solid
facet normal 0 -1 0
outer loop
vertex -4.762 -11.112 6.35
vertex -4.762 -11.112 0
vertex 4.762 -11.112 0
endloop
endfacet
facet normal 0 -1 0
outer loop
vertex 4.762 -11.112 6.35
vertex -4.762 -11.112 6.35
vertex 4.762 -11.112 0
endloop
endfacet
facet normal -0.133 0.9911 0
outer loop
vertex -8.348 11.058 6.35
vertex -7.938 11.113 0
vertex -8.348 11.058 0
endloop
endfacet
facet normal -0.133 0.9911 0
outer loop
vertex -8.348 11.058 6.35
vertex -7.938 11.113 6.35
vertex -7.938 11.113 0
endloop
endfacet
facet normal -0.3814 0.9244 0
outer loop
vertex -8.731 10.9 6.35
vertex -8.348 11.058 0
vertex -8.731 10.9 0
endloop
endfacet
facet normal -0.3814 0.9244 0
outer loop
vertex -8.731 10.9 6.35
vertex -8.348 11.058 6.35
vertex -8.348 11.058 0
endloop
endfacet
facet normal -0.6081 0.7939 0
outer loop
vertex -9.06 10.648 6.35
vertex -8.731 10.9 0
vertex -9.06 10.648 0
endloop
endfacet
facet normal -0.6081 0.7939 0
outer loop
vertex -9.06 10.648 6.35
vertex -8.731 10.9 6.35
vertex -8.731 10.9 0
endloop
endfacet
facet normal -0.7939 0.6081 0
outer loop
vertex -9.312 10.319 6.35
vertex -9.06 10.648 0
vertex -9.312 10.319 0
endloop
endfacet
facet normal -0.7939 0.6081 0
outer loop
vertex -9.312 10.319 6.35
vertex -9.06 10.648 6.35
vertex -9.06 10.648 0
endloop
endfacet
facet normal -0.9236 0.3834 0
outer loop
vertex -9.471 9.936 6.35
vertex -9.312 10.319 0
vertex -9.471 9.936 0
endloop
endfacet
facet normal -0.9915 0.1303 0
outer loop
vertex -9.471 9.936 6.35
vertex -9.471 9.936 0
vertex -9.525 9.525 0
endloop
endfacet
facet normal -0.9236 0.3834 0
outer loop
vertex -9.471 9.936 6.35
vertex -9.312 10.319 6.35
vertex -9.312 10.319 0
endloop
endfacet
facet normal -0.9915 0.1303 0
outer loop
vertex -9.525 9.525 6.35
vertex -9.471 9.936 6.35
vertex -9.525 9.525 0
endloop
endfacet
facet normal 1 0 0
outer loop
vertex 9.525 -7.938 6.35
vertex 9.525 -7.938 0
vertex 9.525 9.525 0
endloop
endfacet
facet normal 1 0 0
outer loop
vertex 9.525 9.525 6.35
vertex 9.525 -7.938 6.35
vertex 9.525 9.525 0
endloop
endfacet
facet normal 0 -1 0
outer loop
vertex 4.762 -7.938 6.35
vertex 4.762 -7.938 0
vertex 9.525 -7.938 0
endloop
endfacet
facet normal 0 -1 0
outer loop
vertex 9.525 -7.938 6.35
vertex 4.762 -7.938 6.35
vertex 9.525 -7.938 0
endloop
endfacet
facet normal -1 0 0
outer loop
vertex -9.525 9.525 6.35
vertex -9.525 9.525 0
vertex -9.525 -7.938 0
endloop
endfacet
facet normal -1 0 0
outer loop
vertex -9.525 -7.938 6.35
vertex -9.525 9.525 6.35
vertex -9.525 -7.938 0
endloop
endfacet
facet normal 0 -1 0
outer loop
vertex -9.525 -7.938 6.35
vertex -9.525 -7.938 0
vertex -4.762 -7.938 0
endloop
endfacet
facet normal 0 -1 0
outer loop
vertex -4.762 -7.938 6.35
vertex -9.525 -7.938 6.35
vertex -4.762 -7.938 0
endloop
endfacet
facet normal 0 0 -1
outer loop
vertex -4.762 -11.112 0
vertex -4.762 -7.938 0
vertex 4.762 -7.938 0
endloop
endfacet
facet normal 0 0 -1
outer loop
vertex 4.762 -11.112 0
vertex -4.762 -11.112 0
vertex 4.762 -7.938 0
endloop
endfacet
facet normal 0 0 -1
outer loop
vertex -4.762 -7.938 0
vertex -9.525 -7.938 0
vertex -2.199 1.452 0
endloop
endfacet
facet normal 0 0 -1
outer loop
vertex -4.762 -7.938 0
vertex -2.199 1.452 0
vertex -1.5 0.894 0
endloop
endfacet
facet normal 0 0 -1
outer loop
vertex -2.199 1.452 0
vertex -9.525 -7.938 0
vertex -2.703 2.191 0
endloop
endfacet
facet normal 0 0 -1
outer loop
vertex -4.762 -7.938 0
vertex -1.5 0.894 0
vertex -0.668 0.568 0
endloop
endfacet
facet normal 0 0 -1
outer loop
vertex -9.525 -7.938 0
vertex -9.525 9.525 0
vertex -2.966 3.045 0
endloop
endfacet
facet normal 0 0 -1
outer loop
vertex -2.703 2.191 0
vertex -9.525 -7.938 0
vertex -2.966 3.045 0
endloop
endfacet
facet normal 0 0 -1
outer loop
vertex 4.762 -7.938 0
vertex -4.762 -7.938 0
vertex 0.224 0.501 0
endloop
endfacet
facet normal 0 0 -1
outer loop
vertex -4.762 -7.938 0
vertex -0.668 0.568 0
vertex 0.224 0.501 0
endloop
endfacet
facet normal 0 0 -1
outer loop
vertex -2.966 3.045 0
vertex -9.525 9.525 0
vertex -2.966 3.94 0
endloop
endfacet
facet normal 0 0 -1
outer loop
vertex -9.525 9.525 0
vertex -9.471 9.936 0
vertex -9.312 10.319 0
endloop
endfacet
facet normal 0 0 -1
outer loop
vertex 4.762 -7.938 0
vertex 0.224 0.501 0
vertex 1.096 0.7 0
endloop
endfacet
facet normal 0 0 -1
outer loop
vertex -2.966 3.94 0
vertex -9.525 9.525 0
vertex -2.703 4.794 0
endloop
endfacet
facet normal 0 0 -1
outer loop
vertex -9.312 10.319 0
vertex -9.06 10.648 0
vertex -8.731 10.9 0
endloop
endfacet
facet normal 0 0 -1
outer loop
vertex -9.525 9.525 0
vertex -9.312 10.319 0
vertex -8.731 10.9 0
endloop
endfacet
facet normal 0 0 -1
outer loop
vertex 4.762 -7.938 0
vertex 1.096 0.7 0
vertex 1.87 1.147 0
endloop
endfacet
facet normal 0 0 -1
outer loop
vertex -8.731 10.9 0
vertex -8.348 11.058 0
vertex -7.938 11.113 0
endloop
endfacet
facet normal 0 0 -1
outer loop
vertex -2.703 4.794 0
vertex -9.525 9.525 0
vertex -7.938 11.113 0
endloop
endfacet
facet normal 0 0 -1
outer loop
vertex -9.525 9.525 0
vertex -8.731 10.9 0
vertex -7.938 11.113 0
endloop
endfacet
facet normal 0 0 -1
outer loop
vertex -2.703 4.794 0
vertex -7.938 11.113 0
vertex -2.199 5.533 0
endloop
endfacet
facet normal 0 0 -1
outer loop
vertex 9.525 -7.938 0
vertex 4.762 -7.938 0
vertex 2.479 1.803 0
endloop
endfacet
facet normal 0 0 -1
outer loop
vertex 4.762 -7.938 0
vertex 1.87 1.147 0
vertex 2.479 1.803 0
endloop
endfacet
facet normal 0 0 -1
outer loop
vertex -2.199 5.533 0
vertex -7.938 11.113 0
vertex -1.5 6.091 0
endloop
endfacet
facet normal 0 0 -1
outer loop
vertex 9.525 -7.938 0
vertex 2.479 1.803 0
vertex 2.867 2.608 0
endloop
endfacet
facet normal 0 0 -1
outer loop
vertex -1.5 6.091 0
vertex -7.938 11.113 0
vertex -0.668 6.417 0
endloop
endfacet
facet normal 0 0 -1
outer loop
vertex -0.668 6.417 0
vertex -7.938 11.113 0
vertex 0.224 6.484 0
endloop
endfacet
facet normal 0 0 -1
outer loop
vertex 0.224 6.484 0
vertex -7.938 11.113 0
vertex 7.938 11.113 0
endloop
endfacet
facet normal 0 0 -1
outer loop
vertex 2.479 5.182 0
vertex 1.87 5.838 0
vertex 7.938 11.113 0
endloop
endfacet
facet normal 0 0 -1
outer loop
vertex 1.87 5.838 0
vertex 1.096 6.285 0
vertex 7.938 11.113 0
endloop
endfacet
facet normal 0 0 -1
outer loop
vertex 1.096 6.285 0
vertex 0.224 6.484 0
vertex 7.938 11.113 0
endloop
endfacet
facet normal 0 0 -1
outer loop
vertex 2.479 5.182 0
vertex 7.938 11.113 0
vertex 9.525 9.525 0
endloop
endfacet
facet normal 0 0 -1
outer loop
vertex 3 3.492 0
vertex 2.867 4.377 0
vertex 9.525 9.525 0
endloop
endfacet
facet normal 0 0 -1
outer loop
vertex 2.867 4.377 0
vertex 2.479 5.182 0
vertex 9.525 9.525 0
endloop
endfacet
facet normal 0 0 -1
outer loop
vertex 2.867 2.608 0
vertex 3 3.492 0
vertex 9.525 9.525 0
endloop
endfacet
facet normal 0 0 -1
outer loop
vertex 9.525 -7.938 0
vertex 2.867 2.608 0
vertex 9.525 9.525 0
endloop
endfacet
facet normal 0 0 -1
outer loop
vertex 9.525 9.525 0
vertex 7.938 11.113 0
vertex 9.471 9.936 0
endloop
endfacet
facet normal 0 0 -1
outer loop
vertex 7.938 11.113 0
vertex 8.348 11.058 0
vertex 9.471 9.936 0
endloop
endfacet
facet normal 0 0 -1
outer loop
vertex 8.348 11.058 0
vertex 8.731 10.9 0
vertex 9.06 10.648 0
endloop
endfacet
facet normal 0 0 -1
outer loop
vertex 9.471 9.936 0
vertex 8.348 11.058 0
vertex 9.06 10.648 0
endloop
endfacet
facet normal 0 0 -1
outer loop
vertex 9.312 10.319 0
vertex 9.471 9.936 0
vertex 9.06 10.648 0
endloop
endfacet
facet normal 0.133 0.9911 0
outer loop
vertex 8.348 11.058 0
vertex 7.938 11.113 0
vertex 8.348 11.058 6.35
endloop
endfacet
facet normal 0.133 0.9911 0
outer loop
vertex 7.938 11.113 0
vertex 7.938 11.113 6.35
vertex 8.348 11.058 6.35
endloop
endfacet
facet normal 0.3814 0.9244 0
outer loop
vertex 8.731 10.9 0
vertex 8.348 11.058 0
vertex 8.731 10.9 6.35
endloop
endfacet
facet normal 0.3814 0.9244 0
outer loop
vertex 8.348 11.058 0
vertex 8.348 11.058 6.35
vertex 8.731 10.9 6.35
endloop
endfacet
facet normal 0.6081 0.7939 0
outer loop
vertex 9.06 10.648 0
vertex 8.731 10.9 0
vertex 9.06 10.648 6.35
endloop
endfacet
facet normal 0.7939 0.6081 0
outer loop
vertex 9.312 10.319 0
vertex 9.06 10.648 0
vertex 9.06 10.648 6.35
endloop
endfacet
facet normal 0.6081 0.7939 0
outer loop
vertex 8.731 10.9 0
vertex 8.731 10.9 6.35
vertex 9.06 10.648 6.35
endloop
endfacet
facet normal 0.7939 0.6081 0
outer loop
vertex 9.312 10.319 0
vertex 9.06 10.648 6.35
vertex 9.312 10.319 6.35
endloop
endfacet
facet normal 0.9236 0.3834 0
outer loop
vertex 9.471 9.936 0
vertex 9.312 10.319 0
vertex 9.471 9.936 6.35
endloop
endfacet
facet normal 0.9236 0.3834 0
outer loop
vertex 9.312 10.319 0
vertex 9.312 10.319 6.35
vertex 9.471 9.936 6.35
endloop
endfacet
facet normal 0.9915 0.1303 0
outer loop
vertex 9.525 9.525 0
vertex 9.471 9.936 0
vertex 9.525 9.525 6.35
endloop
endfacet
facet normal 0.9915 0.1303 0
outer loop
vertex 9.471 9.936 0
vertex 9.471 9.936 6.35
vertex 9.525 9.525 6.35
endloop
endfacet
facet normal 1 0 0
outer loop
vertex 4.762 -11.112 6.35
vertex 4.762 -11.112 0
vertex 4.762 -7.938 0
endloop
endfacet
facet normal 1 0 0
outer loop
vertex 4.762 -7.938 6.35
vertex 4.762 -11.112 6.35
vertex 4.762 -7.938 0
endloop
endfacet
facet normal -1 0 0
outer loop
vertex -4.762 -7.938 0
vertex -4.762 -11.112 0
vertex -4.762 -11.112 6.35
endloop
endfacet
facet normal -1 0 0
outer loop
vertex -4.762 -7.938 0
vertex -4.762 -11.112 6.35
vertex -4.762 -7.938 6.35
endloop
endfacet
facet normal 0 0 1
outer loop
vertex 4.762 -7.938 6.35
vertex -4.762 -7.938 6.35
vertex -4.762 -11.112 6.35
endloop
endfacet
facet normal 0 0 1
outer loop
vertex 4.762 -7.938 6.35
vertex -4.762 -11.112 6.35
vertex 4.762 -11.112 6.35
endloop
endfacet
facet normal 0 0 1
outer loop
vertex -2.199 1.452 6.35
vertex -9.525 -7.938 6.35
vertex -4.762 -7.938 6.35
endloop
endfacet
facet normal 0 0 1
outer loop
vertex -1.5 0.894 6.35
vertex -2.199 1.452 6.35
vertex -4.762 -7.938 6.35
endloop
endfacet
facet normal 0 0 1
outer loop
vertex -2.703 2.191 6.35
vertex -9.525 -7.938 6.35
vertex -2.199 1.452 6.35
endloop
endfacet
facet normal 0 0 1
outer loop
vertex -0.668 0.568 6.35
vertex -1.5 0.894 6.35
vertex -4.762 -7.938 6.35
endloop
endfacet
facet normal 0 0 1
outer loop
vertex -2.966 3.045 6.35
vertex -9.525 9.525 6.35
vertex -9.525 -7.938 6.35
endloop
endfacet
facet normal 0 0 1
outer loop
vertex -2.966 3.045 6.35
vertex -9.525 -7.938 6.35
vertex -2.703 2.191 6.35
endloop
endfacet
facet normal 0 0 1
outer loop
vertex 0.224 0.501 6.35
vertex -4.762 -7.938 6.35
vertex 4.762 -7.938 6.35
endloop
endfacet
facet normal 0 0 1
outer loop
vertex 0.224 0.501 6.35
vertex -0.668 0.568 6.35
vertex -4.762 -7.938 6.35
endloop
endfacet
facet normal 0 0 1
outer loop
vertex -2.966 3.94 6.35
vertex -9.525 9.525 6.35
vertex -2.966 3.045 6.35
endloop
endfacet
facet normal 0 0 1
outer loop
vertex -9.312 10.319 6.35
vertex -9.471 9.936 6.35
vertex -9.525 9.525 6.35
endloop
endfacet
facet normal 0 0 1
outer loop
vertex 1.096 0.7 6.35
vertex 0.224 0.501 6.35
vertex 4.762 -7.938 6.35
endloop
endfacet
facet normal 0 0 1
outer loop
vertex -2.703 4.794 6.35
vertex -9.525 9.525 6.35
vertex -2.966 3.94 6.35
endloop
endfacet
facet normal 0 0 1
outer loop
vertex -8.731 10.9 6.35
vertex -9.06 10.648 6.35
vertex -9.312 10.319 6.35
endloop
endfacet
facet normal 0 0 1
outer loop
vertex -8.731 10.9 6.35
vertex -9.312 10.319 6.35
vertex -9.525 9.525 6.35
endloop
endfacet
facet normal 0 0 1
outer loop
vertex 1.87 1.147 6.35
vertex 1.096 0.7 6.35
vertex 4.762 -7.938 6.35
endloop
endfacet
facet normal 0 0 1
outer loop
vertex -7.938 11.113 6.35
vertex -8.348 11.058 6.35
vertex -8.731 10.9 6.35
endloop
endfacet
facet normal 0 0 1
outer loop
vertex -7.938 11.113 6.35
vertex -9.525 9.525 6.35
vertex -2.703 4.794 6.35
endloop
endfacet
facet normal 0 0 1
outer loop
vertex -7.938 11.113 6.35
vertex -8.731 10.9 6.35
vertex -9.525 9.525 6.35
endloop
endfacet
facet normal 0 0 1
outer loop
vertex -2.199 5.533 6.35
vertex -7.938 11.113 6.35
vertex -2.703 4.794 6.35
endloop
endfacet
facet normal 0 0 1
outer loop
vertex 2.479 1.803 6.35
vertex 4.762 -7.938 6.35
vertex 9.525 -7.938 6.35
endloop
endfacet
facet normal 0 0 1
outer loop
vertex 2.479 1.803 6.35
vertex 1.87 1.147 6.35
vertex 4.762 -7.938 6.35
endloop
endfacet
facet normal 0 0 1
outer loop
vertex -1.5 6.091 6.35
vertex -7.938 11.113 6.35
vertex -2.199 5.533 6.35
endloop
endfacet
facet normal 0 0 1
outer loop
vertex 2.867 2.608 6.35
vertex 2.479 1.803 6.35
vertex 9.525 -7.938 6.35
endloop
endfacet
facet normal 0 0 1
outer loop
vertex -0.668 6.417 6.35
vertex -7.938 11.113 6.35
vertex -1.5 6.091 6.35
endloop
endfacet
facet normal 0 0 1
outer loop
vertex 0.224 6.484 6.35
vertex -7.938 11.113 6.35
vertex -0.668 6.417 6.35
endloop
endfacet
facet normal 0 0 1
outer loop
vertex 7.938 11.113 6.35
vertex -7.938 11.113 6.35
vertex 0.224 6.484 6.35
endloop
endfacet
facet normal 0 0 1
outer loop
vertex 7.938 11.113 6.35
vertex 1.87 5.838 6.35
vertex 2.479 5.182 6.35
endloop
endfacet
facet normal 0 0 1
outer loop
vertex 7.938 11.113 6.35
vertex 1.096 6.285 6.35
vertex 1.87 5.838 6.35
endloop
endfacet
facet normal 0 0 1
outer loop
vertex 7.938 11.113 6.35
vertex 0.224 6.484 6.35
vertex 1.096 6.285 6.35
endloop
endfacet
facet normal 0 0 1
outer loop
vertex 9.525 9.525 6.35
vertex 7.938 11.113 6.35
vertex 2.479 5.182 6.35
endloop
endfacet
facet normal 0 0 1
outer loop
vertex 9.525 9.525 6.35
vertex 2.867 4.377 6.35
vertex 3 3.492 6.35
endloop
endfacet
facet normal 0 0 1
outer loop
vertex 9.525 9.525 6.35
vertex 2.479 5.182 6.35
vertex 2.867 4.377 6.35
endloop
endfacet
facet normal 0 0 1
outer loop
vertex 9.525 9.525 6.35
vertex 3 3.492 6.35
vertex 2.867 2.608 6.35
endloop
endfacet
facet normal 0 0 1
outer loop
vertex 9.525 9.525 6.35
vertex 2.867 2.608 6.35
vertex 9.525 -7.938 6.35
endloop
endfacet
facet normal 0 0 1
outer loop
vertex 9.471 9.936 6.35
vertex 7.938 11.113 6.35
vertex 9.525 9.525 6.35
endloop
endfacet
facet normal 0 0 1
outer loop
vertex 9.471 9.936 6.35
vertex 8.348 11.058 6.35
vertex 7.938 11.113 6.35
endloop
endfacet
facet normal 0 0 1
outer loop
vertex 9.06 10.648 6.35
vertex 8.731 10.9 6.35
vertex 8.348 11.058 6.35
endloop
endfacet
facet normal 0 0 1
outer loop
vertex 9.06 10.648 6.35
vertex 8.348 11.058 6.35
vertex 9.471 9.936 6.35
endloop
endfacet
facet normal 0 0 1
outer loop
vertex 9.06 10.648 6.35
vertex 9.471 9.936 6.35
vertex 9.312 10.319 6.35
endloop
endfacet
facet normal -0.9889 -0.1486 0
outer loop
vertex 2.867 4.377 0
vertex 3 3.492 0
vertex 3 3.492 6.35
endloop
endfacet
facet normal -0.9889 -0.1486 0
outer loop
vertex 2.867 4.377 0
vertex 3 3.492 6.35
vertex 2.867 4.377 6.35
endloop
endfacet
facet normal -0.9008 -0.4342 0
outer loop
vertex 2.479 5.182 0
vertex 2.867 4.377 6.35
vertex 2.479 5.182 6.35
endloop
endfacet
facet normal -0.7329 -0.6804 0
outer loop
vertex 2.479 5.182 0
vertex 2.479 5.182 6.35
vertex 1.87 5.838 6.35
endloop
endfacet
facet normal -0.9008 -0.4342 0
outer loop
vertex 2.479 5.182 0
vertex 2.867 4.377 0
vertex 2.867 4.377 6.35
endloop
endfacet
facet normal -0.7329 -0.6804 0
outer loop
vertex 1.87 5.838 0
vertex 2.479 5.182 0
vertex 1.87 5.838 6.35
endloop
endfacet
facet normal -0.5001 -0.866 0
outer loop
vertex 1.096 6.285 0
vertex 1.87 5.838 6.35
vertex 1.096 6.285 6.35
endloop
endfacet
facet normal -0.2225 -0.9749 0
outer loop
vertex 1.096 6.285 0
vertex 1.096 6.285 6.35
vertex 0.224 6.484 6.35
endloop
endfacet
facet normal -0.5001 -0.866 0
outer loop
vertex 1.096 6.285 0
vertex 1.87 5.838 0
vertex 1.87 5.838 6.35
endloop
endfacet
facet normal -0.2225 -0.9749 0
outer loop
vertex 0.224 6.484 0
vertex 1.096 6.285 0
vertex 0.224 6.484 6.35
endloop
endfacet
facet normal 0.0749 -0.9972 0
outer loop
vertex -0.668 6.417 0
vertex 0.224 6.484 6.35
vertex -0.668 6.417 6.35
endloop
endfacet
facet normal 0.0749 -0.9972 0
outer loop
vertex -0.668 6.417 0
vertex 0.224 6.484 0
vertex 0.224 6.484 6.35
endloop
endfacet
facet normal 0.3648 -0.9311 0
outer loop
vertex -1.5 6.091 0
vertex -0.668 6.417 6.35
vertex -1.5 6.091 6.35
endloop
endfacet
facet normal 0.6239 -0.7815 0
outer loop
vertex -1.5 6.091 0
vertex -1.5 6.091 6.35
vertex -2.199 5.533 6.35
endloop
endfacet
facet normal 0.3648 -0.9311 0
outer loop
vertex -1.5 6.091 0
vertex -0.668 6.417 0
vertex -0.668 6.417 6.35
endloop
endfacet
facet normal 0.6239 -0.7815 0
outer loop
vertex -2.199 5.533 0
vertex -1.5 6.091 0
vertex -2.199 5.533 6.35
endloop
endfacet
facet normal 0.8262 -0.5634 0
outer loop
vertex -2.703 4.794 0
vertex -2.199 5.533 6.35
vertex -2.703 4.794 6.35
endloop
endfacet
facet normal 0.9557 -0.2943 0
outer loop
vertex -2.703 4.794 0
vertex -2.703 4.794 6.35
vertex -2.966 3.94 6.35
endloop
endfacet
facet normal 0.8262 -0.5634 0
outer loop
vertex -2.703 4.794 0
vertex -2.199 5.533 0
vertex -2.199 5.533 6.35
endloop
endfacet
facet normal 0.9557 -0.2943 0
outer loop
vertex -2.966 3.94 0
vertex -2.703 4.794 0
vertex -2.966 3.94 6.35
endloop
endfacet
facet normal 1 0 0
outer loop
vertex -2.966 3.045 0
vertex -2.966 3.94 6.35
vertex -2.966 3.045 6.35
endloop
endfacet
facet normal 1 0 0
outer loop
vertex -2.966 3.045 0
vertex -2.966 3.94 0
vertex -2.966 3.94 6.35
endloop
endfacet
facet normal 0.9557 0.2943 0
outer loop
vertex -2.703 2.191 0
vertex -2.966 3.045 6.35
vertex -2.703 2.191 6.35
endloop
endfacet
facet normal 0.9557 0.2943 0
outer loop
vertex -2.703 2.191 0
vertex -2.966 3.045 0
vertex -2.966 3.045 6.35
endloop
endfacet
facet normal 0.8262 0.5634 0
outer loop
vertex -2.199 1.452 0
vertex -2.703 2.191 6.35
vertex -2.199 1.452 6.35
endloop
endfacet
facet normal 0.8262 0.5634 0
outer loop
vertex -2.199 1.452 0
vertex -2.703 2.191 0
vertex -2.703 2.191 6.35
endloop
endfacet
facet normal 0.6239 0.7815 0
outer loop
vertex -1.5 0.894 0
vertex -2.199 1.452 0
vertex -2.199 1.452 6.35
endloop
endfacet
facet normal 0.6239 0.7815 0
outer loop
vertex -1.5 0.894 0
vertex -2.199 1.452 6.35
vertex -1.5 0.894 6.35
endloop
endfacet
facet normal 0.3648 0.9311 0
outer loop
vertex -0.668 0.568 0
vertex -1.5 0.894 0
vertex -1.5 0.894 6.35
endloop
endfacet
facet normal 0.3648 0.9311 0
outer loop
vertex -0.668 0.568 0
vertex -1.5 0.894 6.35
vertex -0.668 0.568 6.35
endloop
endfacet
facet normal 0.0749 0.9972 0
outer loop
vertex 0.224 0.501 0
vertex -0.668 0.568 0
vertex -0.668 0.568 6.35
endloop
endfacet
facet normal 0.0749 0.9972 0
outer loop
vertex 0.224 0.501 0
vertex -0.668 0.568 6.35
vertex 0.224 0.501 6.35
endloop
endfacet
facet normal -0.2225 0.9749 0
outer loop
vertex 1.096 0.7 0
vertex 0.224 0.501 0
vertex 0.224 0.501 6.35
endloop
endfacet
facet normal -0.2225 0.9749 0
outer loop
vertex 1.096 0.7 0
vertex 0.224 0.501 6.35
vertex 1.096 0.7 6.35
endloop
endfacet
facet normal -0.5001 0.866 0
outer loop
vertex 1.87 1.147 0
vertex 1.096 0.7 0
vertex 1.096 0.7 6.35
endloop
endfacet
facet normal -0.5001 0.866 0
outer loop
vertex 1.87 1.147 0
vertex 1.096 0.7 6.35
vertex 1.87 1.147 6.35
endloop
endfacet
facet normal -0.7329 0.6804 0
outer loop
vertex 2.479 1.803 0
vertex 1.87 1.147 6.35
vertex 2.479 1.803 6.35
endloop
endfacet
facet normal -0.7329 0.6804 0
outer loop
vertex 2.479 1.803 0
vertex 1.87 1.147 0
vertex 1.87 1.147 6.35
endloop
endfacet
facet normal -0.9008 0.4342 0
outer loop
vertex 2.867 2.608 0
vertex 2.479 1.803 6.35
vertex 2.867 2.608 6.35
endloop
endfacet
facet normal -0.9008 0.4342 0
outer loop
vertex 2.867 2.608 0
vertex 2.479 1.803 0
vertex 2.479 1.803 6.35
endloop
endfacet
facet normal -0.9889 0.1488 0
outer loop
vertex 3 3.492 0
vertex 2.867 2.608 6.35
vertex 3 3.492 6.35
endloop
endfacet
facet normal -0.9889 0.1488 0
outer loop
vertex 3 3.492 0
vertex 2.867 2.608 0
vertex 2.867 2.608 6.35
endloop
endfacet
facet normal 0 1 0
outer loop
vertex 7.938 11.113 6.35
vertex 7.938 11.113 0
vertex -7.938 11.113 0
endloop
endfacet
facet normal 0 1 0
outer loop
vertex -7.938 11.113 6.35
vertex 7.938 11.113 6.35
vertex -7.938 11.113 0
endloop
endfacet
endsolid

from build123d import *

# Parameters (mm, degrees)
SKETCH1_R           = 3
SKETCH1_W           = 9.525
SKETCH1_H           = 3.175
BOSS_EXTRUDE1_DEPTH = 6.35
FILLET1_R           = 1.5875


with BuildPart() as part:
    # Sketch1 → Boss-Extrude1 (new body)
    # profile 1 of 2: a face of its own
    with BuildSketch(Plane.XY):
        Polygon((9.525, 11.1125), (-9.525, 11.1125), (-9.525, -7.9375), (-4.7625, -7.9375), (4.7625, -7.9375), (9.525, -7.9375), align=None)
        with Locations((0, 3.4925)):
            Circle(SKETCH1_R, mode=Mode.SUBTRACT)
    # profile 2 of 2: a face of its own
    with BuildSketch(Plane.XY):
        with Locations((0, -9.525)):
            Rectangle(SKETCH1_W, SKETCH1_H)
    extrude(amount=BOSS_EXTRUDE1_DEPTH)

    # Fillet1
    fillet1_edges = [part.edges().sort_by_distance(p)[0] for p in [
        (-9.525, 11.1125, 3.175),
        (9.525, 11.1125, 3.175),
    ]]
    fillet(fillet1_edges, radius=FILLET1_R)


solid = part.part
